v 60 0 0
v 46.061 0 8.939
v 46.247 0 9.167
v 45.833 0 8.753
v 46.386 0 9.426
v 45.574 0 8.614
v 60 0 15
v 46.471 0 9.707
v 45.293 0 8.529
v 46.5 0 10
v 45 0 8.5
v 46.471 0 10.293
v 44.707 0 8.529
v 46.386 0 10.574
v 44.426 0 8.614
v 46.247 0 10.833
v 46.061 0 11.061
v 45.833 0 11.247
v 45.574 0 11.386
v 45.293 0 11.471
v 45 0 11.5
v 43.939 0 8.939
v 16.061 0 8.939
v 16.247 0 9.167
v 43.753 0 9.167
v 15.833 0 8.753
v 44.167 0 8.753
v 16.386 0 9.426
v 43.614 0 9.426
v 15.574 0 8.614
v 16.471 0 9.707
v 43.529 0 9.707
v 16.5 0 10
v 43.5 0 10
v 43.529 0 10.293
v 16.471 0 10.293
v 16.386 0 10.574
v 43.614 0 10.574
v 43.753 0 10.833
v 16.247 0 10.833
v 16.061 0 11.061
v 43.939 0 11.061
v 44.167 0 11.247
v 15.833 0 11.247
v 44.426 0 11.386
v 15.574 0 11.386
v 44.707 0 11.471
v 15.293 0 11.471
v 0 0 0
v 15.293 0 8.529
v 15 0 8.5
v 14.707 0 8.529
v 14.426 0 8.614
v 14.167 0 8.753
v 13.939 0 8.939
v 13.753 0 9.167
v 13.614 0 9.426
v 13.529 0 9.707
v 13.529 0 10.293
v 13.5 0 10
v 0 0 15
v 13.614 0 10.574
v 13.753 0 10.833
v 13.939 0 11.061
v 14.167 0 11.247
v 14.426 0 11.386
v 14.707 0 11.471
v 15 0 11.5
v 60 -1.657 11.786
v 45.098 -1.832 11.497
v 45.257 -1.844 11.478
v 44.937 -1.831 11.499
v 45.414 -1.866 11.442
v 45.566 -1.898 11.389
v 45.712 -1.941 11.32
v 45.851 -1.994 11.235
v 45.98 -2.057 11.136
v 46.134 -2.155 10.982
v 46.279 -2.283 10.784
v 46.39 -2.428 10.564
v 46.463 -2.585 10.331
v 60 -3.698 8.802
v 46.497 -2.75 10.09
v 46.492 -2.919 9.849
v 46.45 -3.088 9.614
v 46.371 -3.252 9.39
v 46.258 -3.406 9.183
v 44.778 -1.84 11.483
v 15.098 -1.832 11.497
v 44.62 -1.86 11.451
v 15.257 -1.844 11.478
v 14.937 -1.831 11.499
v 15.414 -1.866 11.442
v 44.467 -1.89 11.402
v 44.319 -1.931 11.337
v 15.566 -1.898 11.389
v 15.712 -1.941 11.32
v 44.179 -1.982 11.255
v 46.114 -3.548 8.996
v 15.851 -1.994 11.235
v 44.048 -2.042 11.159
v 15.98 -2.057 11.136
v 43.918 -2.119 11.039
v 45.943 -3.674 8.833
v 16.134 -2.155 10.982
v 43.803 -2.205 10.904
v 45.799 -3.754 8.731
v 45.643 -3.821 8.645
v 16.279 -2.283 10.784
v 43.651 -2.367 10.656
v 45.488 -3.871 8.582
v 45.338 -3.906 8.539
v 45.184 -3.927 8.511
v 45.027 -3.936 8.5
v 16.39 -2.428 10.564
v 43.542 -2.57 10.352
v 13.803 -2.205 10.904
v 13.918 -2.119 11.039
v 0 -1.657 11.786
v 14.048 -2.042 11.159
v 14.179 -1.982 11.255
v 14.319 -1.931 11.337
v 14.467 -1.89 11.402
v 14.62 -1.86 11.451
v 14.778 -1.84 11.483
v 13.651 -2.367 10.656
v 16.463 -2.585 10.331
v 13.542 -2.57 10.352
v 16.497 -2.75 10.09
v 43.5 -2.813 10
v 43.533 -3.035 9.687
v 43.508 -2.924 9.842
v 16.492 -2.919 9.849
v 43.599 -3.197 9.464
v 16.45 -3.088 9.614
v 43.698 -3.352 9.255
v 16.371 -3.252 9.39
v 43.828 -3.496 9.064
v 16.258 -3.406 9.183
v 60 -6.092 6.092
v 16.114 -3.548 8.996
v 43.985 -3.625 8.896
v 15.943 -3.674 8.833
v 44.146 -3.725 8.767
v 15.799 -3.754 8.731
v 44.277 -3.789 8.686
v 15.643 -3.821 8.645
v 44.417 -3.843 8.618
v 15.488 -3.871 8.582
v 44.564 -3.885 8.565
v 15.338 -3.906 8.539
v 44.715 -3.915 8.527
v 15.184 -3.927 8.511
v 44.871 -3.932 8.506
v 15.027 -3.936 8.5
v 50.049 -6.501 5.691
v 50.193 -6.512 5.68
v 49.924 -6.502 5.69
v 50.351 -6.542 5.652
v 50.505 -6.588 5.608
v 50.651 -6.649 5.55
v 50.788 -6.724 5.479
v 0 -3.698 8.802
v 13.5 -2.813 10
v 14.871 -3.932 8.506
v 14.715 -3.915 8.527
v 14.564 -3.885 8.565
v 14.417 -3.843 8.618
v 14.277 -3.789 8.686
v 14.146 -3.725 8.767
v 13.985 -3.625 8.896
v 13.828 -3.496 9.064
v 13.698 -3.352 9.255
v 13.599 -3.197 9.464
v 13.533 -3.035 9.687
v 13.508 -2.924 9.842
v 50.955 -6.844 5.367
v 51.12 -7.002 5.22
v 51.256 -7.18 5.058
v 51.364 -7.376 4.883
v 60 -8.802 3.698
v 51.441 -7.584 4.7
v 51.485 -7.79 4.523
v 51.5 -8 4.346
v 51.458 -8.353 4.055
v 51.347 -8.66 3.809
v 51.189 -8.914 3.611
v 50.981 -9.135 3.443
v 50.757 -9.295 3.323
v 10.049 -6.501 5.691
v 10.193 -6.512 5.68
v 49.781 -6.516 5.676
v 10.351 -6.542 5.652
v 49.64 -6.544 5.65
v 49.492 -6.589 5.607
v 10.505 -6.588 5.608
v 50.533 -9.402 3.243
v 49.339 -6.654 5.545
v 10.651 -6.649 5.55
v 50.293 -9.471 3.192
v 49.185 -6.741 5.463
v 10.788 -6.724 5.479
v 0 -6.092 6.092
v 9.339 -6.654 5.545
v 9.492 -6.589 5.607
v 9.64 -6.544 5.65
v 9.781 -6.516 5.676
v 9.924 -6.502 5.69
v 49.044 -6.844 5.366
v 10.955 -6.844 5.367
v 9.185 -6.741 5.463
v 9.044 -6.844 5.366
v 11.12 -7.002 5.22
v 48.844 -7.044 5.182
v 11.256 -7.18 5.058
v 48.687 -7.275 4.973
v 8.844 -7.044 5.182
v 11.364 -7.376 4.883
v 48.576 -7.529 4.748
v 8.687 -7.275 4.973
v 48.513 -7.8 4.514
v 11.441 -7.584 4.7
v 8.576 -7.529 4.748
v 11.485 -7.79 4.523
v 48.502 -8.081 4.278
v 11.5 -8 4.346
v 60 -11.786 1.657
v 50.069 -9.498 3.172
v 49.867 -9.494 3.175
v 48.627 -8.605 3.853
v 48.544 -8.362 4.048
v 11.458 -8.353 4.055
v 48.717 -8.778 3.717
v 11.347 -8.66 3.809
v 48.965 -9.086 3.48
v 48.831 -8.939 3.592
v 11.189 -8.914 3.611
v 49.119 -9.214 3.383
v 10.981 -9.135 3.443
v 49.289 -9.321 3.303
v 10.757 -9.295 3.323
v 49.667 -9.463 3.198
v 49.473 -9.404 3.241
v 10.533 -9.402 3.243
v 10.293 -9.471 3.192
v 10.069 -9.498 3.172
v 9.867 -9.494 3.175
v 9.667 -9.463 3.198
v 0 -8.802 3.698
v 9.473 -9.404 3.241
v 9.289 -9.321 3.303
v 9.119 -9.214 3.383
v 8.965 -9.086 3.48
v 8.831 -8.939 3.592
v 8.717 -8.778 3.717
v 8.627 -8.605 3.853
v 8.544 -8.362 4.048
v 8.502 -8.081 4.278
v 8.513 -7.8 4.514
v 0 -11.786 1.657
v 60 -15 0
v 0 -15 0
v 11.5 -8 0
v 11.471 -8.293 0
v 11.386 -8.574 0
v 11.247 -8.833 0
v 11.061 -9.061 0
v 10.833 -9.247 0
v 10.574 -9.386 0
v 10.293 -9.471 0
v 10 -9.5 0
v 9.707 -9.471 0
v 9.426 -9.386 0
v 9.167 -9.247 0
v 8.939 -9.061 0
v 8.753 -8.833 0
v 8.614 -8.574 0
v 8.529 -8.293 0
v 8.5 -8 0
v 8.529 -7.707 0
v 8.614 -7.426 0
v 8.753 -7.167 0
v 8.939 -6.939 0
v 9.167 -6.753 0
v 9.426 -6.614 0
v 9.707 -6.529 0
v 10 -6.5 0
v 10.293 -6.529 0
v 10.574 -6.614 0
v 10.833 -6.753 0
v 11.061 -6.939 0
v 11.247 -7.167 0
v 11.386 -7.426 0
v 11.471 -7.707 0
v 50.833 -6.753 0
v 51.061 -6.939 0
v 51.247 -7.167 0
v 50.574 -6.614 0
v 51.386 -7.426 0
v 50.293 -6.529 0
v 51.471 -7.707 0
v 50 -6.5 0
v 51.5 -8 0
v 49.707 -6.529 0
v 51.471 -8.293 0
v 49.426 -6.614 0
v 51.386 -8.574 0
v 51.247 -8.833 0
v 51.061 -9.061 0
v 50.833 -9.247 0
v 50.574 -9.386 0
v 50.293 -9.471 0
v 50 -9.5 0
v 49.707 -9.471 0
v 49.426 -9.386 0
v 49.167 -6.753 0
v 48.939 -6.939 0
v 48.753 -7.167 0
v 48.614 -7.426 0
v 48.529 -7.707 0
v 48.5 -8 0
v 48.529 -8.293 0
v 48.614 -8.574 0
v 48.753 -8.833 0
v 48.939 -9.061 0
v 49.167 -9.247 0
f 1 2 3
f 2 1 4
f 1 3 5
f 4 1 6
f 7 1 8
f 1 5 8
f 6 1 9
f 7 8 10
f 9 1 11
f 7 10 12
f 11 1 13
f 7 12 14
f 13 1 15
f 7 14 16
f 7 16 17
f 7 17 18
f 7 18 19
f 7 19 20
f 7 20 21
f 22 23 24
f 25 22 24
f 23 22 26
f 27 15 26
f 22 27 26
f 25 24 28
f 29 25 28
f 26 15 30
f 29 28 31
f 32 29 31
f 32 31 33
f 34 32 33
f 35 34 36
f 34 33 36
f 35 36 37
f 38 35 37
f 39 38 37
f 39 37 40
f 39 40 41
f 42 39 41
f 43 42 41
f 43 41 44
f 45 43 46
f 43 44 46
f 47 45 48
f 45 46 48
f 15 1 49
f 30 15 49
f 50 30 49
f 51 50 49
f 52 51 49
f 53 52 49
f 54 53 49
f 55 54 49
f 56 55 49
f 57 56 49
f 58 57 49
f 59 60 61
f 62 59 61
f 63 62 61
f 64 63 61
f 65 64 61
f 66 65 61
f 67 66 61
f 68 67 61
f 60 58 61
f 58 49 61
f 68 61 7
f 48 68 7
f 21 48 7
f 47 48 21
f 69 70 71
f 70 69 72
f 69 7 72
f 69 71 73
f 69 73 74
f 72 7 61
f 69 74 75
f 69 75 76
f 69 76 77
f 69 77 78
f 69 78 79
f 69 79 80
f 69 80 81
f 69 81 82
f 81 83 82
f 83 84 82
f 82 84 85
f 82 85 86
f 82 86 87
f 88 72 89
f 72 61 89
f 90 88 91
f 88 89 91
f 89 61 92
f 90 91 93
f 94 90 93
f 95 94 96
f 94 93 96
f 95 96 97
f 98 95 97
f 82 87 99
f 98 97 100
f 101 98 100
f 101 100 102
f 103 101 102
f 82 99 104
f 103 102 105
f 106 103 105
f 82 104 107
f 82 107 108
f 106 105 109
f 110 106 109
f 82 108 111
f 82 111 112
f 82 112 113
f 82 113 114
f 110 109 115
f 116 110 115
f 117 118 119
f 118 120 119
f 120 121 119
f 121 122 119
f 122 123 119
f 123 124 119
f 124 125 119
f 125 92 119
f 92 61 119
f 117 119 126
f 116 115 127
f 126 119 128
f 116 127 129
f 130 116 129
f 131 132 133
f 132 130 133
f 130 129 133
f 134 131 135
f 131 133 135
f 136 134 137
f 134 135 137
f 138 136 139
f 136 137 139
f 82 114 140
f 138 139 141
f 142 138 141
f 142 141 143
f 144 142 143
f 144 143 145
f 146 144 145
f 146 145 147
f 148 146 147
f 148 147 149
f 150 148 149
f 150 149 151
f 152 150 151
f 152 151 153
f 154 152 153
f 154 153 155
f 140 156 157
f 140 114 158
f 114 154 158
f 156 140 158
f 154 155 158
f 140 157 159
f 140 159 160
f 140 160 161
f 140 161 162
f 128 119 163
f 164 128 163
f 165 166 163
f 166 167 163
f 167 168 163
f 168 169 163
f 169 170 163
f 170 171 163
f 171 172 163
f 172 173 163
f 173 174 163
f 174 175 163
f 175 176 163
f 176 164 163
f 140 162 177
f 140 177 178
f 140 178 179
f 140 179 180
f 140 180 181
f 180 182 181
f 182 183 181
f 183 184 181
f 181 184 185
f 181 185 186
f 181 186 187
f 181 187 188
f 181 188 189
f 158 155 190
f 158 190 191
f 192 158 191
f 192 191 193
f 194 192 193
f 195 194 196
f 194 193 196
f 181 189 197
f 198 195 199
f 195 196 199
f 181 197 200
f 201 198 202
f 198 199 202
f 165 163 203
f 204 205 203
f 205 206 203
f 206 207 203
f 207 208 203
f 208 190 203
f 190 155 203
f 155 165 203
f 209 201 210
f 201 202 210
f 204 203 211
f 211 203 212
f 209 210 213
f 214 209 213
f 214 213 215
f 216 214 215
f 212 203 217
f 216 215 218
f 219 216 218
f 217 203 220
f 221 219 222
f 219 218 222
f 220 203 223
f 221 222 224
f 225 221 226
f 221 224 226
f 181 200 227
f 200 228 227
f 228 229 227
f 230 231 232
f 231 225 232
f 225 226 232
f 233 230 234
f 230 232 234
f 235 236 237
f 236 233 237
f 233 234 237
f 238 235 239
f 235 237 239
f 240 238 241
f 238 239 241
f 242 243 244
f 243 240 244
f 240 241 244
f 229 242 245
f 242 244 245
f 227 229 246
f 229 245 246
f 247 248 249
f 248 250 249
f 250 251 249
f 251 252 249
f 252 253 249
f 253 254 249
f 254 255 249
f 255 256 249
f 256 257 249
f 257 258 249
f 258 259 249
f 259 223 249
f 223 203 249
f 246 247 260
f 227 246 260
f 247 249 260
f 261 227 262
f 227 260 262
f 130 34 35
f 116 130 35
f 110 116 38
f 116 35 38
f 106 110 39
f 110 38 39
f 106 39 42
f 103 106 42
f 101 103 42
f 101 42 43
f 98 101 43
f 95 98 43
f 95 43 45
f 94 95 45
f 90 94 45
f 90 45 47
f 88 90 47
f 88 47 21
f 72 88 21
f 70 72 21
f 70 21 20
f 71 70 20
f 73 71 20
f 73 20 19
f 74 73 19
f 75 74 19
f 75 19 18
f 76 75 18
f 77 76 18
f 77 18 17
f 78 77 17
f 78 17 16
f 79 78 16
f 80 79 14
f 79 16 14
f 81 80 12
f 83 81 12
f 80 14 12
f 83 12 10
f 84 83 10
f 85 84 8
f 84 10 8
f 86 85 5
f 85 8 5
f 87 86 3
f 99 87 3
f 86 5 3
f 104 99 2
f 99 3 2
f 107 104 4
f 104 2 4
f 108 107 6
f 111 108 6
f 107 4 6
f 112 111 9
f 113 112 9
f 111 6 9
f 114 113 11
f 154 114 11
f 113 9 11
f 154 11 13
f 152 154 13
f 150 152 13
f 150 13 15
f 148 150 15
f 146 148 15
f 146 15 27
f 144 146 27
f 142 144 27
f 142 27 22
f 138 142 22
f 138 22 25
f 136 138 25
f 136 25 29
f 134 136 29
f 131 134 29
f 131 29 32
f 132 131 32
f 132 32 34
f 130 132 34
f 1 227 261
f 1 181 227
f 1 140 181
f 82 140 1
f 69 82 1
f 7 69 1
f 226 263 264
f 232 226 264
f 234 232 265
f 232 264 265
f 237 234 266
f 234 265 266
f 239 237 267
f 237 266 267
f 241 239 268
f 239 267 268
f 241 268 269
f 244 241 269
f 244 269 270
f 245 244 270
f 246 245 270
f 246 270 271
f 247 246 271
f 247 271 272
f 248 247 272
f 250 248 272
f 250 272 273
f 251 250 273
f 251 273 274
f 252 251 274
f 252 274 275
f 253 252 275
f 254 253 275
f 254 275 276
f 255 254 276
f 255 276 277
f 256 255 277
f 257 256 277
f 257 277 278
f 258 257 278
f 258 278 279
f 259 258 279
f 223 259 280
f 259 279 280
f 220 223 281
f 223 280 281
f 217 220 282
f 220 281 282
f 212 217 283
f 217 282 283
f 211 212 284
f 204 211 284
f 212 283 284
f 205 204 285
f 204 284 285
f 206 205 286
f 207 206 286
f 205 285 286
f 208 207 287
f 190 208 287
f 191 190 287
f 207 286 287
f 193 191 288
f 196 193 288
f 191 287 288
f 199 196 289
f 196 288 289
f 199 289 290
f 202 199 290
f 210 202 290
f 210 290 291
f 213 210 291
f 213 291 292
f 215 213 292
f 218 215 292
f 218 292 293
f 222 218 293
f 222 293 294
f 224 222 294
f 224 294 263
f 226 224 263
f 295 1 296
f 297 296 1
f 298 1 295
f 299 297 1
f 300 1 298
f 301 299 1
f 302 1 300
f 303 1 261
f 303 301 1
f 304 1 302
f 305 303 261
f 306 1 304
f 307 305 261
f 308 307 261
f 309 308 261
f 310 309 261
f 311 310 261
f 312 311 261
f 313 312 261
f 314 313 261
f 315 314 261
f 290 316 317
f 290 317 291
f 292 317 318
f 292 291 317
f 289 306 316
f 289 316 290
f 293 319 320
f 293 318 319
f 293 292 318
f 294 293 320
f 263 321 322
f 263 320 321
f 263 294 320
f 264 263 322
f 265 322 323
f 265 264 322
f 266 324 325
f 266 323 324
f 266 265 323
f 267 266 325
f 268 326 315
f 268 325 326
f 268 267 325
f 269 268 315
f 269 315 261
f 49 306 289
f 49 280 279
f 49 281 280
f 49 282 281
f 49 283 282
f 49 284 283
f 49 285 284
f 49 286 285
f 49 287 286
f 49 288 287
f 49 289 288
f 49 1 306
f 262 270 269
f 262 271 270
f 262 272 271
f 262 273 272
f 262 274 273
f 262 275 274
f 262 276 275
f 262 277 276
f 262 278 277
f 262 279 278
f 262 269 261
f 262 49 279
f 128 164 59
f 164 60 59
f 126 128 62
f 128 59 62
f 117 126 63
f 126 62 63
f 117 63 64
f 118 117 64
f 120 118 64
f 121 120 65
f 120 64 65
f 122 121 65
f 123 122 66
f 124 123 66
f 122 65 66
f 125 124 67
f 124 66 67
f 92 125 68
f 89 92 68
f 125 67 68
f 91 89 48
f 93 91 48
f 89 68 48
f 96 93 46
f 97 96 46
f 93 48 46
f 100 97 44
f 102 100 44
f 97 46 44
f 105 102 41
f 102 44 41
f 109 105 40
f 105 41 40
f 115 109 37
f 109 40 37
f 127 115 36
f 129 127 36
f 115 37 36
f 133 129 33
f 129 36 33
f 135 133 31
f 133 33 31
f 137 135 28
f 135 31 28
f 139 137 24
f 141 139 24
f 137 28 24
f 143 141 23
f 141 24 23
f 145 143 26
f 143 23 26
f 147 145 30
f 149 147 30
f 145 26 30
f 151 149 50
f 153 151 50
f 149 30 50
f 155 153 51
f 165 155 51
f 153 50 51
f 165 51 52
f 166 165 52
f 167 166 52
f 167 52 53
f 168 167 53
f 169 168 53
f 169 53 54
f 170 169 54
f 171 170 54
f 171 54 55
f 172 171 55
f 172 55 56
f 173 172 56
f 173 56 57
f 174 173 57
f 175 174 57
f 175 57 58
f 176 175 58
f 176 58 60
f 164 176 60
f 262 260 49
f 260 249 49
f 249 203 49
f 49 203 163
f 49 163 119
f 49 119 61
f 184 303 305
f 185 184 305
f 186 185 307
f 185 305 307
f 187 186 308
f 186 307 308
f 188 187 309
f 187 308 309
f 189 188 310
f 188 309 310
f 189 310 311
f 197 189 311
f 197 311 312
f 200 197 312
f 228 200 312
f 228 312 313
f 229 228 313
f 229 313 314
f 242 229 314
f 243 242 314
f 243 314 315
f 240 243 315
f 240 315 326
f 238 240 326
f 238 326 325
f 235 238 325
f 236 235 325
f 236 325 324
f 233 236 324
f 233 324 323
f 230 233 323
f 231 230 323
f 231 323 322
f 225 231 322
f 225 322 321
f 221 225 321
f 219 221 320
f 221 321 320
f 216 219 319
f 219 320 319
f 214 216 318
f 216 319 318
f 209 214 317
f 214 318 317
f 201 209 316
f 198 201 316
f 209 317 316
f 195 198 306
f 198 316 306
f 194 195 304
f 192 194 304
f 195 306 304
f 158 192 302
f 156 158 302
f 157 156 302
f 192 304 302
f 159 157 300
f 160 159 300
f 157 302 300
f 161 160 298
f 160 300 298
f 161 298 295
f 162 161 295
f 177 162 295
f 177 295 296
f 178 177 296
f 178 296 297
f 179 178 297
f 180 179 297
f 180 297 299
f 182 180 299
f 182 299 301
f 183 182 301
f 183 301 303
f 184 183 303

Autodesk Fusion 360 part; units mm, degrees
sketch "Boceto1" plane through (0, 0, 0) normal (1, 0, 0) x (0, 1, 0)
  line L0 (0, 0) -> (-15, 0)
  line L1 (0, 0) -> (0, 15)
  arc A0 (-15, 0) -> (0, 15) centre (-26.7699, 26.7699) ccw
  dimension "d1" = 15
  dimension "d2" = 15
extrude "Extruir1" add sketch "Boceto1" along normal blind 60
sketch "Boceto2" plane through (0, 0, 0) normal (0, 1, 0) x (-1, 0, 0)
  line L0 (0, 0) -> (0, 15)
  line L1 (0, 15) -> (-60, 15)
  line L2 (-60, 15) -> (-60, 0)
  line L3 (-60, 0) -> (0, 0)
  circle A0 centre (-45, 10) radius 1.5
  circle A1 centre (-15, 10) radius 1.5
  dimension "d7" = 3
  dimension "d10" = 3
extrude "Extruir2" cut sketch "Boceto2" against normal blind 4 contours A0 | A1
sketch "Boceto3" plane through (0, 0, 0) normal (0, 0, -1) x (1, 0, 0)
  line L0 (0, 15) -> (0, 0)
  line L1 (0, 0) -> (60, 0)
  line L2 (60, 0) -> (60, 15)
  line L3 (60, 15) -> (0, 15)
  circle A0 centre (10, 8) radius 1.5
  circle A1 centre (50, 8) radius 1.5
  dimension "d17" = 3
  dimension "d18" = 3
extrude "Extruir3" cut sketch "Boceto3" against normal blind 6 contours A0 | A1
